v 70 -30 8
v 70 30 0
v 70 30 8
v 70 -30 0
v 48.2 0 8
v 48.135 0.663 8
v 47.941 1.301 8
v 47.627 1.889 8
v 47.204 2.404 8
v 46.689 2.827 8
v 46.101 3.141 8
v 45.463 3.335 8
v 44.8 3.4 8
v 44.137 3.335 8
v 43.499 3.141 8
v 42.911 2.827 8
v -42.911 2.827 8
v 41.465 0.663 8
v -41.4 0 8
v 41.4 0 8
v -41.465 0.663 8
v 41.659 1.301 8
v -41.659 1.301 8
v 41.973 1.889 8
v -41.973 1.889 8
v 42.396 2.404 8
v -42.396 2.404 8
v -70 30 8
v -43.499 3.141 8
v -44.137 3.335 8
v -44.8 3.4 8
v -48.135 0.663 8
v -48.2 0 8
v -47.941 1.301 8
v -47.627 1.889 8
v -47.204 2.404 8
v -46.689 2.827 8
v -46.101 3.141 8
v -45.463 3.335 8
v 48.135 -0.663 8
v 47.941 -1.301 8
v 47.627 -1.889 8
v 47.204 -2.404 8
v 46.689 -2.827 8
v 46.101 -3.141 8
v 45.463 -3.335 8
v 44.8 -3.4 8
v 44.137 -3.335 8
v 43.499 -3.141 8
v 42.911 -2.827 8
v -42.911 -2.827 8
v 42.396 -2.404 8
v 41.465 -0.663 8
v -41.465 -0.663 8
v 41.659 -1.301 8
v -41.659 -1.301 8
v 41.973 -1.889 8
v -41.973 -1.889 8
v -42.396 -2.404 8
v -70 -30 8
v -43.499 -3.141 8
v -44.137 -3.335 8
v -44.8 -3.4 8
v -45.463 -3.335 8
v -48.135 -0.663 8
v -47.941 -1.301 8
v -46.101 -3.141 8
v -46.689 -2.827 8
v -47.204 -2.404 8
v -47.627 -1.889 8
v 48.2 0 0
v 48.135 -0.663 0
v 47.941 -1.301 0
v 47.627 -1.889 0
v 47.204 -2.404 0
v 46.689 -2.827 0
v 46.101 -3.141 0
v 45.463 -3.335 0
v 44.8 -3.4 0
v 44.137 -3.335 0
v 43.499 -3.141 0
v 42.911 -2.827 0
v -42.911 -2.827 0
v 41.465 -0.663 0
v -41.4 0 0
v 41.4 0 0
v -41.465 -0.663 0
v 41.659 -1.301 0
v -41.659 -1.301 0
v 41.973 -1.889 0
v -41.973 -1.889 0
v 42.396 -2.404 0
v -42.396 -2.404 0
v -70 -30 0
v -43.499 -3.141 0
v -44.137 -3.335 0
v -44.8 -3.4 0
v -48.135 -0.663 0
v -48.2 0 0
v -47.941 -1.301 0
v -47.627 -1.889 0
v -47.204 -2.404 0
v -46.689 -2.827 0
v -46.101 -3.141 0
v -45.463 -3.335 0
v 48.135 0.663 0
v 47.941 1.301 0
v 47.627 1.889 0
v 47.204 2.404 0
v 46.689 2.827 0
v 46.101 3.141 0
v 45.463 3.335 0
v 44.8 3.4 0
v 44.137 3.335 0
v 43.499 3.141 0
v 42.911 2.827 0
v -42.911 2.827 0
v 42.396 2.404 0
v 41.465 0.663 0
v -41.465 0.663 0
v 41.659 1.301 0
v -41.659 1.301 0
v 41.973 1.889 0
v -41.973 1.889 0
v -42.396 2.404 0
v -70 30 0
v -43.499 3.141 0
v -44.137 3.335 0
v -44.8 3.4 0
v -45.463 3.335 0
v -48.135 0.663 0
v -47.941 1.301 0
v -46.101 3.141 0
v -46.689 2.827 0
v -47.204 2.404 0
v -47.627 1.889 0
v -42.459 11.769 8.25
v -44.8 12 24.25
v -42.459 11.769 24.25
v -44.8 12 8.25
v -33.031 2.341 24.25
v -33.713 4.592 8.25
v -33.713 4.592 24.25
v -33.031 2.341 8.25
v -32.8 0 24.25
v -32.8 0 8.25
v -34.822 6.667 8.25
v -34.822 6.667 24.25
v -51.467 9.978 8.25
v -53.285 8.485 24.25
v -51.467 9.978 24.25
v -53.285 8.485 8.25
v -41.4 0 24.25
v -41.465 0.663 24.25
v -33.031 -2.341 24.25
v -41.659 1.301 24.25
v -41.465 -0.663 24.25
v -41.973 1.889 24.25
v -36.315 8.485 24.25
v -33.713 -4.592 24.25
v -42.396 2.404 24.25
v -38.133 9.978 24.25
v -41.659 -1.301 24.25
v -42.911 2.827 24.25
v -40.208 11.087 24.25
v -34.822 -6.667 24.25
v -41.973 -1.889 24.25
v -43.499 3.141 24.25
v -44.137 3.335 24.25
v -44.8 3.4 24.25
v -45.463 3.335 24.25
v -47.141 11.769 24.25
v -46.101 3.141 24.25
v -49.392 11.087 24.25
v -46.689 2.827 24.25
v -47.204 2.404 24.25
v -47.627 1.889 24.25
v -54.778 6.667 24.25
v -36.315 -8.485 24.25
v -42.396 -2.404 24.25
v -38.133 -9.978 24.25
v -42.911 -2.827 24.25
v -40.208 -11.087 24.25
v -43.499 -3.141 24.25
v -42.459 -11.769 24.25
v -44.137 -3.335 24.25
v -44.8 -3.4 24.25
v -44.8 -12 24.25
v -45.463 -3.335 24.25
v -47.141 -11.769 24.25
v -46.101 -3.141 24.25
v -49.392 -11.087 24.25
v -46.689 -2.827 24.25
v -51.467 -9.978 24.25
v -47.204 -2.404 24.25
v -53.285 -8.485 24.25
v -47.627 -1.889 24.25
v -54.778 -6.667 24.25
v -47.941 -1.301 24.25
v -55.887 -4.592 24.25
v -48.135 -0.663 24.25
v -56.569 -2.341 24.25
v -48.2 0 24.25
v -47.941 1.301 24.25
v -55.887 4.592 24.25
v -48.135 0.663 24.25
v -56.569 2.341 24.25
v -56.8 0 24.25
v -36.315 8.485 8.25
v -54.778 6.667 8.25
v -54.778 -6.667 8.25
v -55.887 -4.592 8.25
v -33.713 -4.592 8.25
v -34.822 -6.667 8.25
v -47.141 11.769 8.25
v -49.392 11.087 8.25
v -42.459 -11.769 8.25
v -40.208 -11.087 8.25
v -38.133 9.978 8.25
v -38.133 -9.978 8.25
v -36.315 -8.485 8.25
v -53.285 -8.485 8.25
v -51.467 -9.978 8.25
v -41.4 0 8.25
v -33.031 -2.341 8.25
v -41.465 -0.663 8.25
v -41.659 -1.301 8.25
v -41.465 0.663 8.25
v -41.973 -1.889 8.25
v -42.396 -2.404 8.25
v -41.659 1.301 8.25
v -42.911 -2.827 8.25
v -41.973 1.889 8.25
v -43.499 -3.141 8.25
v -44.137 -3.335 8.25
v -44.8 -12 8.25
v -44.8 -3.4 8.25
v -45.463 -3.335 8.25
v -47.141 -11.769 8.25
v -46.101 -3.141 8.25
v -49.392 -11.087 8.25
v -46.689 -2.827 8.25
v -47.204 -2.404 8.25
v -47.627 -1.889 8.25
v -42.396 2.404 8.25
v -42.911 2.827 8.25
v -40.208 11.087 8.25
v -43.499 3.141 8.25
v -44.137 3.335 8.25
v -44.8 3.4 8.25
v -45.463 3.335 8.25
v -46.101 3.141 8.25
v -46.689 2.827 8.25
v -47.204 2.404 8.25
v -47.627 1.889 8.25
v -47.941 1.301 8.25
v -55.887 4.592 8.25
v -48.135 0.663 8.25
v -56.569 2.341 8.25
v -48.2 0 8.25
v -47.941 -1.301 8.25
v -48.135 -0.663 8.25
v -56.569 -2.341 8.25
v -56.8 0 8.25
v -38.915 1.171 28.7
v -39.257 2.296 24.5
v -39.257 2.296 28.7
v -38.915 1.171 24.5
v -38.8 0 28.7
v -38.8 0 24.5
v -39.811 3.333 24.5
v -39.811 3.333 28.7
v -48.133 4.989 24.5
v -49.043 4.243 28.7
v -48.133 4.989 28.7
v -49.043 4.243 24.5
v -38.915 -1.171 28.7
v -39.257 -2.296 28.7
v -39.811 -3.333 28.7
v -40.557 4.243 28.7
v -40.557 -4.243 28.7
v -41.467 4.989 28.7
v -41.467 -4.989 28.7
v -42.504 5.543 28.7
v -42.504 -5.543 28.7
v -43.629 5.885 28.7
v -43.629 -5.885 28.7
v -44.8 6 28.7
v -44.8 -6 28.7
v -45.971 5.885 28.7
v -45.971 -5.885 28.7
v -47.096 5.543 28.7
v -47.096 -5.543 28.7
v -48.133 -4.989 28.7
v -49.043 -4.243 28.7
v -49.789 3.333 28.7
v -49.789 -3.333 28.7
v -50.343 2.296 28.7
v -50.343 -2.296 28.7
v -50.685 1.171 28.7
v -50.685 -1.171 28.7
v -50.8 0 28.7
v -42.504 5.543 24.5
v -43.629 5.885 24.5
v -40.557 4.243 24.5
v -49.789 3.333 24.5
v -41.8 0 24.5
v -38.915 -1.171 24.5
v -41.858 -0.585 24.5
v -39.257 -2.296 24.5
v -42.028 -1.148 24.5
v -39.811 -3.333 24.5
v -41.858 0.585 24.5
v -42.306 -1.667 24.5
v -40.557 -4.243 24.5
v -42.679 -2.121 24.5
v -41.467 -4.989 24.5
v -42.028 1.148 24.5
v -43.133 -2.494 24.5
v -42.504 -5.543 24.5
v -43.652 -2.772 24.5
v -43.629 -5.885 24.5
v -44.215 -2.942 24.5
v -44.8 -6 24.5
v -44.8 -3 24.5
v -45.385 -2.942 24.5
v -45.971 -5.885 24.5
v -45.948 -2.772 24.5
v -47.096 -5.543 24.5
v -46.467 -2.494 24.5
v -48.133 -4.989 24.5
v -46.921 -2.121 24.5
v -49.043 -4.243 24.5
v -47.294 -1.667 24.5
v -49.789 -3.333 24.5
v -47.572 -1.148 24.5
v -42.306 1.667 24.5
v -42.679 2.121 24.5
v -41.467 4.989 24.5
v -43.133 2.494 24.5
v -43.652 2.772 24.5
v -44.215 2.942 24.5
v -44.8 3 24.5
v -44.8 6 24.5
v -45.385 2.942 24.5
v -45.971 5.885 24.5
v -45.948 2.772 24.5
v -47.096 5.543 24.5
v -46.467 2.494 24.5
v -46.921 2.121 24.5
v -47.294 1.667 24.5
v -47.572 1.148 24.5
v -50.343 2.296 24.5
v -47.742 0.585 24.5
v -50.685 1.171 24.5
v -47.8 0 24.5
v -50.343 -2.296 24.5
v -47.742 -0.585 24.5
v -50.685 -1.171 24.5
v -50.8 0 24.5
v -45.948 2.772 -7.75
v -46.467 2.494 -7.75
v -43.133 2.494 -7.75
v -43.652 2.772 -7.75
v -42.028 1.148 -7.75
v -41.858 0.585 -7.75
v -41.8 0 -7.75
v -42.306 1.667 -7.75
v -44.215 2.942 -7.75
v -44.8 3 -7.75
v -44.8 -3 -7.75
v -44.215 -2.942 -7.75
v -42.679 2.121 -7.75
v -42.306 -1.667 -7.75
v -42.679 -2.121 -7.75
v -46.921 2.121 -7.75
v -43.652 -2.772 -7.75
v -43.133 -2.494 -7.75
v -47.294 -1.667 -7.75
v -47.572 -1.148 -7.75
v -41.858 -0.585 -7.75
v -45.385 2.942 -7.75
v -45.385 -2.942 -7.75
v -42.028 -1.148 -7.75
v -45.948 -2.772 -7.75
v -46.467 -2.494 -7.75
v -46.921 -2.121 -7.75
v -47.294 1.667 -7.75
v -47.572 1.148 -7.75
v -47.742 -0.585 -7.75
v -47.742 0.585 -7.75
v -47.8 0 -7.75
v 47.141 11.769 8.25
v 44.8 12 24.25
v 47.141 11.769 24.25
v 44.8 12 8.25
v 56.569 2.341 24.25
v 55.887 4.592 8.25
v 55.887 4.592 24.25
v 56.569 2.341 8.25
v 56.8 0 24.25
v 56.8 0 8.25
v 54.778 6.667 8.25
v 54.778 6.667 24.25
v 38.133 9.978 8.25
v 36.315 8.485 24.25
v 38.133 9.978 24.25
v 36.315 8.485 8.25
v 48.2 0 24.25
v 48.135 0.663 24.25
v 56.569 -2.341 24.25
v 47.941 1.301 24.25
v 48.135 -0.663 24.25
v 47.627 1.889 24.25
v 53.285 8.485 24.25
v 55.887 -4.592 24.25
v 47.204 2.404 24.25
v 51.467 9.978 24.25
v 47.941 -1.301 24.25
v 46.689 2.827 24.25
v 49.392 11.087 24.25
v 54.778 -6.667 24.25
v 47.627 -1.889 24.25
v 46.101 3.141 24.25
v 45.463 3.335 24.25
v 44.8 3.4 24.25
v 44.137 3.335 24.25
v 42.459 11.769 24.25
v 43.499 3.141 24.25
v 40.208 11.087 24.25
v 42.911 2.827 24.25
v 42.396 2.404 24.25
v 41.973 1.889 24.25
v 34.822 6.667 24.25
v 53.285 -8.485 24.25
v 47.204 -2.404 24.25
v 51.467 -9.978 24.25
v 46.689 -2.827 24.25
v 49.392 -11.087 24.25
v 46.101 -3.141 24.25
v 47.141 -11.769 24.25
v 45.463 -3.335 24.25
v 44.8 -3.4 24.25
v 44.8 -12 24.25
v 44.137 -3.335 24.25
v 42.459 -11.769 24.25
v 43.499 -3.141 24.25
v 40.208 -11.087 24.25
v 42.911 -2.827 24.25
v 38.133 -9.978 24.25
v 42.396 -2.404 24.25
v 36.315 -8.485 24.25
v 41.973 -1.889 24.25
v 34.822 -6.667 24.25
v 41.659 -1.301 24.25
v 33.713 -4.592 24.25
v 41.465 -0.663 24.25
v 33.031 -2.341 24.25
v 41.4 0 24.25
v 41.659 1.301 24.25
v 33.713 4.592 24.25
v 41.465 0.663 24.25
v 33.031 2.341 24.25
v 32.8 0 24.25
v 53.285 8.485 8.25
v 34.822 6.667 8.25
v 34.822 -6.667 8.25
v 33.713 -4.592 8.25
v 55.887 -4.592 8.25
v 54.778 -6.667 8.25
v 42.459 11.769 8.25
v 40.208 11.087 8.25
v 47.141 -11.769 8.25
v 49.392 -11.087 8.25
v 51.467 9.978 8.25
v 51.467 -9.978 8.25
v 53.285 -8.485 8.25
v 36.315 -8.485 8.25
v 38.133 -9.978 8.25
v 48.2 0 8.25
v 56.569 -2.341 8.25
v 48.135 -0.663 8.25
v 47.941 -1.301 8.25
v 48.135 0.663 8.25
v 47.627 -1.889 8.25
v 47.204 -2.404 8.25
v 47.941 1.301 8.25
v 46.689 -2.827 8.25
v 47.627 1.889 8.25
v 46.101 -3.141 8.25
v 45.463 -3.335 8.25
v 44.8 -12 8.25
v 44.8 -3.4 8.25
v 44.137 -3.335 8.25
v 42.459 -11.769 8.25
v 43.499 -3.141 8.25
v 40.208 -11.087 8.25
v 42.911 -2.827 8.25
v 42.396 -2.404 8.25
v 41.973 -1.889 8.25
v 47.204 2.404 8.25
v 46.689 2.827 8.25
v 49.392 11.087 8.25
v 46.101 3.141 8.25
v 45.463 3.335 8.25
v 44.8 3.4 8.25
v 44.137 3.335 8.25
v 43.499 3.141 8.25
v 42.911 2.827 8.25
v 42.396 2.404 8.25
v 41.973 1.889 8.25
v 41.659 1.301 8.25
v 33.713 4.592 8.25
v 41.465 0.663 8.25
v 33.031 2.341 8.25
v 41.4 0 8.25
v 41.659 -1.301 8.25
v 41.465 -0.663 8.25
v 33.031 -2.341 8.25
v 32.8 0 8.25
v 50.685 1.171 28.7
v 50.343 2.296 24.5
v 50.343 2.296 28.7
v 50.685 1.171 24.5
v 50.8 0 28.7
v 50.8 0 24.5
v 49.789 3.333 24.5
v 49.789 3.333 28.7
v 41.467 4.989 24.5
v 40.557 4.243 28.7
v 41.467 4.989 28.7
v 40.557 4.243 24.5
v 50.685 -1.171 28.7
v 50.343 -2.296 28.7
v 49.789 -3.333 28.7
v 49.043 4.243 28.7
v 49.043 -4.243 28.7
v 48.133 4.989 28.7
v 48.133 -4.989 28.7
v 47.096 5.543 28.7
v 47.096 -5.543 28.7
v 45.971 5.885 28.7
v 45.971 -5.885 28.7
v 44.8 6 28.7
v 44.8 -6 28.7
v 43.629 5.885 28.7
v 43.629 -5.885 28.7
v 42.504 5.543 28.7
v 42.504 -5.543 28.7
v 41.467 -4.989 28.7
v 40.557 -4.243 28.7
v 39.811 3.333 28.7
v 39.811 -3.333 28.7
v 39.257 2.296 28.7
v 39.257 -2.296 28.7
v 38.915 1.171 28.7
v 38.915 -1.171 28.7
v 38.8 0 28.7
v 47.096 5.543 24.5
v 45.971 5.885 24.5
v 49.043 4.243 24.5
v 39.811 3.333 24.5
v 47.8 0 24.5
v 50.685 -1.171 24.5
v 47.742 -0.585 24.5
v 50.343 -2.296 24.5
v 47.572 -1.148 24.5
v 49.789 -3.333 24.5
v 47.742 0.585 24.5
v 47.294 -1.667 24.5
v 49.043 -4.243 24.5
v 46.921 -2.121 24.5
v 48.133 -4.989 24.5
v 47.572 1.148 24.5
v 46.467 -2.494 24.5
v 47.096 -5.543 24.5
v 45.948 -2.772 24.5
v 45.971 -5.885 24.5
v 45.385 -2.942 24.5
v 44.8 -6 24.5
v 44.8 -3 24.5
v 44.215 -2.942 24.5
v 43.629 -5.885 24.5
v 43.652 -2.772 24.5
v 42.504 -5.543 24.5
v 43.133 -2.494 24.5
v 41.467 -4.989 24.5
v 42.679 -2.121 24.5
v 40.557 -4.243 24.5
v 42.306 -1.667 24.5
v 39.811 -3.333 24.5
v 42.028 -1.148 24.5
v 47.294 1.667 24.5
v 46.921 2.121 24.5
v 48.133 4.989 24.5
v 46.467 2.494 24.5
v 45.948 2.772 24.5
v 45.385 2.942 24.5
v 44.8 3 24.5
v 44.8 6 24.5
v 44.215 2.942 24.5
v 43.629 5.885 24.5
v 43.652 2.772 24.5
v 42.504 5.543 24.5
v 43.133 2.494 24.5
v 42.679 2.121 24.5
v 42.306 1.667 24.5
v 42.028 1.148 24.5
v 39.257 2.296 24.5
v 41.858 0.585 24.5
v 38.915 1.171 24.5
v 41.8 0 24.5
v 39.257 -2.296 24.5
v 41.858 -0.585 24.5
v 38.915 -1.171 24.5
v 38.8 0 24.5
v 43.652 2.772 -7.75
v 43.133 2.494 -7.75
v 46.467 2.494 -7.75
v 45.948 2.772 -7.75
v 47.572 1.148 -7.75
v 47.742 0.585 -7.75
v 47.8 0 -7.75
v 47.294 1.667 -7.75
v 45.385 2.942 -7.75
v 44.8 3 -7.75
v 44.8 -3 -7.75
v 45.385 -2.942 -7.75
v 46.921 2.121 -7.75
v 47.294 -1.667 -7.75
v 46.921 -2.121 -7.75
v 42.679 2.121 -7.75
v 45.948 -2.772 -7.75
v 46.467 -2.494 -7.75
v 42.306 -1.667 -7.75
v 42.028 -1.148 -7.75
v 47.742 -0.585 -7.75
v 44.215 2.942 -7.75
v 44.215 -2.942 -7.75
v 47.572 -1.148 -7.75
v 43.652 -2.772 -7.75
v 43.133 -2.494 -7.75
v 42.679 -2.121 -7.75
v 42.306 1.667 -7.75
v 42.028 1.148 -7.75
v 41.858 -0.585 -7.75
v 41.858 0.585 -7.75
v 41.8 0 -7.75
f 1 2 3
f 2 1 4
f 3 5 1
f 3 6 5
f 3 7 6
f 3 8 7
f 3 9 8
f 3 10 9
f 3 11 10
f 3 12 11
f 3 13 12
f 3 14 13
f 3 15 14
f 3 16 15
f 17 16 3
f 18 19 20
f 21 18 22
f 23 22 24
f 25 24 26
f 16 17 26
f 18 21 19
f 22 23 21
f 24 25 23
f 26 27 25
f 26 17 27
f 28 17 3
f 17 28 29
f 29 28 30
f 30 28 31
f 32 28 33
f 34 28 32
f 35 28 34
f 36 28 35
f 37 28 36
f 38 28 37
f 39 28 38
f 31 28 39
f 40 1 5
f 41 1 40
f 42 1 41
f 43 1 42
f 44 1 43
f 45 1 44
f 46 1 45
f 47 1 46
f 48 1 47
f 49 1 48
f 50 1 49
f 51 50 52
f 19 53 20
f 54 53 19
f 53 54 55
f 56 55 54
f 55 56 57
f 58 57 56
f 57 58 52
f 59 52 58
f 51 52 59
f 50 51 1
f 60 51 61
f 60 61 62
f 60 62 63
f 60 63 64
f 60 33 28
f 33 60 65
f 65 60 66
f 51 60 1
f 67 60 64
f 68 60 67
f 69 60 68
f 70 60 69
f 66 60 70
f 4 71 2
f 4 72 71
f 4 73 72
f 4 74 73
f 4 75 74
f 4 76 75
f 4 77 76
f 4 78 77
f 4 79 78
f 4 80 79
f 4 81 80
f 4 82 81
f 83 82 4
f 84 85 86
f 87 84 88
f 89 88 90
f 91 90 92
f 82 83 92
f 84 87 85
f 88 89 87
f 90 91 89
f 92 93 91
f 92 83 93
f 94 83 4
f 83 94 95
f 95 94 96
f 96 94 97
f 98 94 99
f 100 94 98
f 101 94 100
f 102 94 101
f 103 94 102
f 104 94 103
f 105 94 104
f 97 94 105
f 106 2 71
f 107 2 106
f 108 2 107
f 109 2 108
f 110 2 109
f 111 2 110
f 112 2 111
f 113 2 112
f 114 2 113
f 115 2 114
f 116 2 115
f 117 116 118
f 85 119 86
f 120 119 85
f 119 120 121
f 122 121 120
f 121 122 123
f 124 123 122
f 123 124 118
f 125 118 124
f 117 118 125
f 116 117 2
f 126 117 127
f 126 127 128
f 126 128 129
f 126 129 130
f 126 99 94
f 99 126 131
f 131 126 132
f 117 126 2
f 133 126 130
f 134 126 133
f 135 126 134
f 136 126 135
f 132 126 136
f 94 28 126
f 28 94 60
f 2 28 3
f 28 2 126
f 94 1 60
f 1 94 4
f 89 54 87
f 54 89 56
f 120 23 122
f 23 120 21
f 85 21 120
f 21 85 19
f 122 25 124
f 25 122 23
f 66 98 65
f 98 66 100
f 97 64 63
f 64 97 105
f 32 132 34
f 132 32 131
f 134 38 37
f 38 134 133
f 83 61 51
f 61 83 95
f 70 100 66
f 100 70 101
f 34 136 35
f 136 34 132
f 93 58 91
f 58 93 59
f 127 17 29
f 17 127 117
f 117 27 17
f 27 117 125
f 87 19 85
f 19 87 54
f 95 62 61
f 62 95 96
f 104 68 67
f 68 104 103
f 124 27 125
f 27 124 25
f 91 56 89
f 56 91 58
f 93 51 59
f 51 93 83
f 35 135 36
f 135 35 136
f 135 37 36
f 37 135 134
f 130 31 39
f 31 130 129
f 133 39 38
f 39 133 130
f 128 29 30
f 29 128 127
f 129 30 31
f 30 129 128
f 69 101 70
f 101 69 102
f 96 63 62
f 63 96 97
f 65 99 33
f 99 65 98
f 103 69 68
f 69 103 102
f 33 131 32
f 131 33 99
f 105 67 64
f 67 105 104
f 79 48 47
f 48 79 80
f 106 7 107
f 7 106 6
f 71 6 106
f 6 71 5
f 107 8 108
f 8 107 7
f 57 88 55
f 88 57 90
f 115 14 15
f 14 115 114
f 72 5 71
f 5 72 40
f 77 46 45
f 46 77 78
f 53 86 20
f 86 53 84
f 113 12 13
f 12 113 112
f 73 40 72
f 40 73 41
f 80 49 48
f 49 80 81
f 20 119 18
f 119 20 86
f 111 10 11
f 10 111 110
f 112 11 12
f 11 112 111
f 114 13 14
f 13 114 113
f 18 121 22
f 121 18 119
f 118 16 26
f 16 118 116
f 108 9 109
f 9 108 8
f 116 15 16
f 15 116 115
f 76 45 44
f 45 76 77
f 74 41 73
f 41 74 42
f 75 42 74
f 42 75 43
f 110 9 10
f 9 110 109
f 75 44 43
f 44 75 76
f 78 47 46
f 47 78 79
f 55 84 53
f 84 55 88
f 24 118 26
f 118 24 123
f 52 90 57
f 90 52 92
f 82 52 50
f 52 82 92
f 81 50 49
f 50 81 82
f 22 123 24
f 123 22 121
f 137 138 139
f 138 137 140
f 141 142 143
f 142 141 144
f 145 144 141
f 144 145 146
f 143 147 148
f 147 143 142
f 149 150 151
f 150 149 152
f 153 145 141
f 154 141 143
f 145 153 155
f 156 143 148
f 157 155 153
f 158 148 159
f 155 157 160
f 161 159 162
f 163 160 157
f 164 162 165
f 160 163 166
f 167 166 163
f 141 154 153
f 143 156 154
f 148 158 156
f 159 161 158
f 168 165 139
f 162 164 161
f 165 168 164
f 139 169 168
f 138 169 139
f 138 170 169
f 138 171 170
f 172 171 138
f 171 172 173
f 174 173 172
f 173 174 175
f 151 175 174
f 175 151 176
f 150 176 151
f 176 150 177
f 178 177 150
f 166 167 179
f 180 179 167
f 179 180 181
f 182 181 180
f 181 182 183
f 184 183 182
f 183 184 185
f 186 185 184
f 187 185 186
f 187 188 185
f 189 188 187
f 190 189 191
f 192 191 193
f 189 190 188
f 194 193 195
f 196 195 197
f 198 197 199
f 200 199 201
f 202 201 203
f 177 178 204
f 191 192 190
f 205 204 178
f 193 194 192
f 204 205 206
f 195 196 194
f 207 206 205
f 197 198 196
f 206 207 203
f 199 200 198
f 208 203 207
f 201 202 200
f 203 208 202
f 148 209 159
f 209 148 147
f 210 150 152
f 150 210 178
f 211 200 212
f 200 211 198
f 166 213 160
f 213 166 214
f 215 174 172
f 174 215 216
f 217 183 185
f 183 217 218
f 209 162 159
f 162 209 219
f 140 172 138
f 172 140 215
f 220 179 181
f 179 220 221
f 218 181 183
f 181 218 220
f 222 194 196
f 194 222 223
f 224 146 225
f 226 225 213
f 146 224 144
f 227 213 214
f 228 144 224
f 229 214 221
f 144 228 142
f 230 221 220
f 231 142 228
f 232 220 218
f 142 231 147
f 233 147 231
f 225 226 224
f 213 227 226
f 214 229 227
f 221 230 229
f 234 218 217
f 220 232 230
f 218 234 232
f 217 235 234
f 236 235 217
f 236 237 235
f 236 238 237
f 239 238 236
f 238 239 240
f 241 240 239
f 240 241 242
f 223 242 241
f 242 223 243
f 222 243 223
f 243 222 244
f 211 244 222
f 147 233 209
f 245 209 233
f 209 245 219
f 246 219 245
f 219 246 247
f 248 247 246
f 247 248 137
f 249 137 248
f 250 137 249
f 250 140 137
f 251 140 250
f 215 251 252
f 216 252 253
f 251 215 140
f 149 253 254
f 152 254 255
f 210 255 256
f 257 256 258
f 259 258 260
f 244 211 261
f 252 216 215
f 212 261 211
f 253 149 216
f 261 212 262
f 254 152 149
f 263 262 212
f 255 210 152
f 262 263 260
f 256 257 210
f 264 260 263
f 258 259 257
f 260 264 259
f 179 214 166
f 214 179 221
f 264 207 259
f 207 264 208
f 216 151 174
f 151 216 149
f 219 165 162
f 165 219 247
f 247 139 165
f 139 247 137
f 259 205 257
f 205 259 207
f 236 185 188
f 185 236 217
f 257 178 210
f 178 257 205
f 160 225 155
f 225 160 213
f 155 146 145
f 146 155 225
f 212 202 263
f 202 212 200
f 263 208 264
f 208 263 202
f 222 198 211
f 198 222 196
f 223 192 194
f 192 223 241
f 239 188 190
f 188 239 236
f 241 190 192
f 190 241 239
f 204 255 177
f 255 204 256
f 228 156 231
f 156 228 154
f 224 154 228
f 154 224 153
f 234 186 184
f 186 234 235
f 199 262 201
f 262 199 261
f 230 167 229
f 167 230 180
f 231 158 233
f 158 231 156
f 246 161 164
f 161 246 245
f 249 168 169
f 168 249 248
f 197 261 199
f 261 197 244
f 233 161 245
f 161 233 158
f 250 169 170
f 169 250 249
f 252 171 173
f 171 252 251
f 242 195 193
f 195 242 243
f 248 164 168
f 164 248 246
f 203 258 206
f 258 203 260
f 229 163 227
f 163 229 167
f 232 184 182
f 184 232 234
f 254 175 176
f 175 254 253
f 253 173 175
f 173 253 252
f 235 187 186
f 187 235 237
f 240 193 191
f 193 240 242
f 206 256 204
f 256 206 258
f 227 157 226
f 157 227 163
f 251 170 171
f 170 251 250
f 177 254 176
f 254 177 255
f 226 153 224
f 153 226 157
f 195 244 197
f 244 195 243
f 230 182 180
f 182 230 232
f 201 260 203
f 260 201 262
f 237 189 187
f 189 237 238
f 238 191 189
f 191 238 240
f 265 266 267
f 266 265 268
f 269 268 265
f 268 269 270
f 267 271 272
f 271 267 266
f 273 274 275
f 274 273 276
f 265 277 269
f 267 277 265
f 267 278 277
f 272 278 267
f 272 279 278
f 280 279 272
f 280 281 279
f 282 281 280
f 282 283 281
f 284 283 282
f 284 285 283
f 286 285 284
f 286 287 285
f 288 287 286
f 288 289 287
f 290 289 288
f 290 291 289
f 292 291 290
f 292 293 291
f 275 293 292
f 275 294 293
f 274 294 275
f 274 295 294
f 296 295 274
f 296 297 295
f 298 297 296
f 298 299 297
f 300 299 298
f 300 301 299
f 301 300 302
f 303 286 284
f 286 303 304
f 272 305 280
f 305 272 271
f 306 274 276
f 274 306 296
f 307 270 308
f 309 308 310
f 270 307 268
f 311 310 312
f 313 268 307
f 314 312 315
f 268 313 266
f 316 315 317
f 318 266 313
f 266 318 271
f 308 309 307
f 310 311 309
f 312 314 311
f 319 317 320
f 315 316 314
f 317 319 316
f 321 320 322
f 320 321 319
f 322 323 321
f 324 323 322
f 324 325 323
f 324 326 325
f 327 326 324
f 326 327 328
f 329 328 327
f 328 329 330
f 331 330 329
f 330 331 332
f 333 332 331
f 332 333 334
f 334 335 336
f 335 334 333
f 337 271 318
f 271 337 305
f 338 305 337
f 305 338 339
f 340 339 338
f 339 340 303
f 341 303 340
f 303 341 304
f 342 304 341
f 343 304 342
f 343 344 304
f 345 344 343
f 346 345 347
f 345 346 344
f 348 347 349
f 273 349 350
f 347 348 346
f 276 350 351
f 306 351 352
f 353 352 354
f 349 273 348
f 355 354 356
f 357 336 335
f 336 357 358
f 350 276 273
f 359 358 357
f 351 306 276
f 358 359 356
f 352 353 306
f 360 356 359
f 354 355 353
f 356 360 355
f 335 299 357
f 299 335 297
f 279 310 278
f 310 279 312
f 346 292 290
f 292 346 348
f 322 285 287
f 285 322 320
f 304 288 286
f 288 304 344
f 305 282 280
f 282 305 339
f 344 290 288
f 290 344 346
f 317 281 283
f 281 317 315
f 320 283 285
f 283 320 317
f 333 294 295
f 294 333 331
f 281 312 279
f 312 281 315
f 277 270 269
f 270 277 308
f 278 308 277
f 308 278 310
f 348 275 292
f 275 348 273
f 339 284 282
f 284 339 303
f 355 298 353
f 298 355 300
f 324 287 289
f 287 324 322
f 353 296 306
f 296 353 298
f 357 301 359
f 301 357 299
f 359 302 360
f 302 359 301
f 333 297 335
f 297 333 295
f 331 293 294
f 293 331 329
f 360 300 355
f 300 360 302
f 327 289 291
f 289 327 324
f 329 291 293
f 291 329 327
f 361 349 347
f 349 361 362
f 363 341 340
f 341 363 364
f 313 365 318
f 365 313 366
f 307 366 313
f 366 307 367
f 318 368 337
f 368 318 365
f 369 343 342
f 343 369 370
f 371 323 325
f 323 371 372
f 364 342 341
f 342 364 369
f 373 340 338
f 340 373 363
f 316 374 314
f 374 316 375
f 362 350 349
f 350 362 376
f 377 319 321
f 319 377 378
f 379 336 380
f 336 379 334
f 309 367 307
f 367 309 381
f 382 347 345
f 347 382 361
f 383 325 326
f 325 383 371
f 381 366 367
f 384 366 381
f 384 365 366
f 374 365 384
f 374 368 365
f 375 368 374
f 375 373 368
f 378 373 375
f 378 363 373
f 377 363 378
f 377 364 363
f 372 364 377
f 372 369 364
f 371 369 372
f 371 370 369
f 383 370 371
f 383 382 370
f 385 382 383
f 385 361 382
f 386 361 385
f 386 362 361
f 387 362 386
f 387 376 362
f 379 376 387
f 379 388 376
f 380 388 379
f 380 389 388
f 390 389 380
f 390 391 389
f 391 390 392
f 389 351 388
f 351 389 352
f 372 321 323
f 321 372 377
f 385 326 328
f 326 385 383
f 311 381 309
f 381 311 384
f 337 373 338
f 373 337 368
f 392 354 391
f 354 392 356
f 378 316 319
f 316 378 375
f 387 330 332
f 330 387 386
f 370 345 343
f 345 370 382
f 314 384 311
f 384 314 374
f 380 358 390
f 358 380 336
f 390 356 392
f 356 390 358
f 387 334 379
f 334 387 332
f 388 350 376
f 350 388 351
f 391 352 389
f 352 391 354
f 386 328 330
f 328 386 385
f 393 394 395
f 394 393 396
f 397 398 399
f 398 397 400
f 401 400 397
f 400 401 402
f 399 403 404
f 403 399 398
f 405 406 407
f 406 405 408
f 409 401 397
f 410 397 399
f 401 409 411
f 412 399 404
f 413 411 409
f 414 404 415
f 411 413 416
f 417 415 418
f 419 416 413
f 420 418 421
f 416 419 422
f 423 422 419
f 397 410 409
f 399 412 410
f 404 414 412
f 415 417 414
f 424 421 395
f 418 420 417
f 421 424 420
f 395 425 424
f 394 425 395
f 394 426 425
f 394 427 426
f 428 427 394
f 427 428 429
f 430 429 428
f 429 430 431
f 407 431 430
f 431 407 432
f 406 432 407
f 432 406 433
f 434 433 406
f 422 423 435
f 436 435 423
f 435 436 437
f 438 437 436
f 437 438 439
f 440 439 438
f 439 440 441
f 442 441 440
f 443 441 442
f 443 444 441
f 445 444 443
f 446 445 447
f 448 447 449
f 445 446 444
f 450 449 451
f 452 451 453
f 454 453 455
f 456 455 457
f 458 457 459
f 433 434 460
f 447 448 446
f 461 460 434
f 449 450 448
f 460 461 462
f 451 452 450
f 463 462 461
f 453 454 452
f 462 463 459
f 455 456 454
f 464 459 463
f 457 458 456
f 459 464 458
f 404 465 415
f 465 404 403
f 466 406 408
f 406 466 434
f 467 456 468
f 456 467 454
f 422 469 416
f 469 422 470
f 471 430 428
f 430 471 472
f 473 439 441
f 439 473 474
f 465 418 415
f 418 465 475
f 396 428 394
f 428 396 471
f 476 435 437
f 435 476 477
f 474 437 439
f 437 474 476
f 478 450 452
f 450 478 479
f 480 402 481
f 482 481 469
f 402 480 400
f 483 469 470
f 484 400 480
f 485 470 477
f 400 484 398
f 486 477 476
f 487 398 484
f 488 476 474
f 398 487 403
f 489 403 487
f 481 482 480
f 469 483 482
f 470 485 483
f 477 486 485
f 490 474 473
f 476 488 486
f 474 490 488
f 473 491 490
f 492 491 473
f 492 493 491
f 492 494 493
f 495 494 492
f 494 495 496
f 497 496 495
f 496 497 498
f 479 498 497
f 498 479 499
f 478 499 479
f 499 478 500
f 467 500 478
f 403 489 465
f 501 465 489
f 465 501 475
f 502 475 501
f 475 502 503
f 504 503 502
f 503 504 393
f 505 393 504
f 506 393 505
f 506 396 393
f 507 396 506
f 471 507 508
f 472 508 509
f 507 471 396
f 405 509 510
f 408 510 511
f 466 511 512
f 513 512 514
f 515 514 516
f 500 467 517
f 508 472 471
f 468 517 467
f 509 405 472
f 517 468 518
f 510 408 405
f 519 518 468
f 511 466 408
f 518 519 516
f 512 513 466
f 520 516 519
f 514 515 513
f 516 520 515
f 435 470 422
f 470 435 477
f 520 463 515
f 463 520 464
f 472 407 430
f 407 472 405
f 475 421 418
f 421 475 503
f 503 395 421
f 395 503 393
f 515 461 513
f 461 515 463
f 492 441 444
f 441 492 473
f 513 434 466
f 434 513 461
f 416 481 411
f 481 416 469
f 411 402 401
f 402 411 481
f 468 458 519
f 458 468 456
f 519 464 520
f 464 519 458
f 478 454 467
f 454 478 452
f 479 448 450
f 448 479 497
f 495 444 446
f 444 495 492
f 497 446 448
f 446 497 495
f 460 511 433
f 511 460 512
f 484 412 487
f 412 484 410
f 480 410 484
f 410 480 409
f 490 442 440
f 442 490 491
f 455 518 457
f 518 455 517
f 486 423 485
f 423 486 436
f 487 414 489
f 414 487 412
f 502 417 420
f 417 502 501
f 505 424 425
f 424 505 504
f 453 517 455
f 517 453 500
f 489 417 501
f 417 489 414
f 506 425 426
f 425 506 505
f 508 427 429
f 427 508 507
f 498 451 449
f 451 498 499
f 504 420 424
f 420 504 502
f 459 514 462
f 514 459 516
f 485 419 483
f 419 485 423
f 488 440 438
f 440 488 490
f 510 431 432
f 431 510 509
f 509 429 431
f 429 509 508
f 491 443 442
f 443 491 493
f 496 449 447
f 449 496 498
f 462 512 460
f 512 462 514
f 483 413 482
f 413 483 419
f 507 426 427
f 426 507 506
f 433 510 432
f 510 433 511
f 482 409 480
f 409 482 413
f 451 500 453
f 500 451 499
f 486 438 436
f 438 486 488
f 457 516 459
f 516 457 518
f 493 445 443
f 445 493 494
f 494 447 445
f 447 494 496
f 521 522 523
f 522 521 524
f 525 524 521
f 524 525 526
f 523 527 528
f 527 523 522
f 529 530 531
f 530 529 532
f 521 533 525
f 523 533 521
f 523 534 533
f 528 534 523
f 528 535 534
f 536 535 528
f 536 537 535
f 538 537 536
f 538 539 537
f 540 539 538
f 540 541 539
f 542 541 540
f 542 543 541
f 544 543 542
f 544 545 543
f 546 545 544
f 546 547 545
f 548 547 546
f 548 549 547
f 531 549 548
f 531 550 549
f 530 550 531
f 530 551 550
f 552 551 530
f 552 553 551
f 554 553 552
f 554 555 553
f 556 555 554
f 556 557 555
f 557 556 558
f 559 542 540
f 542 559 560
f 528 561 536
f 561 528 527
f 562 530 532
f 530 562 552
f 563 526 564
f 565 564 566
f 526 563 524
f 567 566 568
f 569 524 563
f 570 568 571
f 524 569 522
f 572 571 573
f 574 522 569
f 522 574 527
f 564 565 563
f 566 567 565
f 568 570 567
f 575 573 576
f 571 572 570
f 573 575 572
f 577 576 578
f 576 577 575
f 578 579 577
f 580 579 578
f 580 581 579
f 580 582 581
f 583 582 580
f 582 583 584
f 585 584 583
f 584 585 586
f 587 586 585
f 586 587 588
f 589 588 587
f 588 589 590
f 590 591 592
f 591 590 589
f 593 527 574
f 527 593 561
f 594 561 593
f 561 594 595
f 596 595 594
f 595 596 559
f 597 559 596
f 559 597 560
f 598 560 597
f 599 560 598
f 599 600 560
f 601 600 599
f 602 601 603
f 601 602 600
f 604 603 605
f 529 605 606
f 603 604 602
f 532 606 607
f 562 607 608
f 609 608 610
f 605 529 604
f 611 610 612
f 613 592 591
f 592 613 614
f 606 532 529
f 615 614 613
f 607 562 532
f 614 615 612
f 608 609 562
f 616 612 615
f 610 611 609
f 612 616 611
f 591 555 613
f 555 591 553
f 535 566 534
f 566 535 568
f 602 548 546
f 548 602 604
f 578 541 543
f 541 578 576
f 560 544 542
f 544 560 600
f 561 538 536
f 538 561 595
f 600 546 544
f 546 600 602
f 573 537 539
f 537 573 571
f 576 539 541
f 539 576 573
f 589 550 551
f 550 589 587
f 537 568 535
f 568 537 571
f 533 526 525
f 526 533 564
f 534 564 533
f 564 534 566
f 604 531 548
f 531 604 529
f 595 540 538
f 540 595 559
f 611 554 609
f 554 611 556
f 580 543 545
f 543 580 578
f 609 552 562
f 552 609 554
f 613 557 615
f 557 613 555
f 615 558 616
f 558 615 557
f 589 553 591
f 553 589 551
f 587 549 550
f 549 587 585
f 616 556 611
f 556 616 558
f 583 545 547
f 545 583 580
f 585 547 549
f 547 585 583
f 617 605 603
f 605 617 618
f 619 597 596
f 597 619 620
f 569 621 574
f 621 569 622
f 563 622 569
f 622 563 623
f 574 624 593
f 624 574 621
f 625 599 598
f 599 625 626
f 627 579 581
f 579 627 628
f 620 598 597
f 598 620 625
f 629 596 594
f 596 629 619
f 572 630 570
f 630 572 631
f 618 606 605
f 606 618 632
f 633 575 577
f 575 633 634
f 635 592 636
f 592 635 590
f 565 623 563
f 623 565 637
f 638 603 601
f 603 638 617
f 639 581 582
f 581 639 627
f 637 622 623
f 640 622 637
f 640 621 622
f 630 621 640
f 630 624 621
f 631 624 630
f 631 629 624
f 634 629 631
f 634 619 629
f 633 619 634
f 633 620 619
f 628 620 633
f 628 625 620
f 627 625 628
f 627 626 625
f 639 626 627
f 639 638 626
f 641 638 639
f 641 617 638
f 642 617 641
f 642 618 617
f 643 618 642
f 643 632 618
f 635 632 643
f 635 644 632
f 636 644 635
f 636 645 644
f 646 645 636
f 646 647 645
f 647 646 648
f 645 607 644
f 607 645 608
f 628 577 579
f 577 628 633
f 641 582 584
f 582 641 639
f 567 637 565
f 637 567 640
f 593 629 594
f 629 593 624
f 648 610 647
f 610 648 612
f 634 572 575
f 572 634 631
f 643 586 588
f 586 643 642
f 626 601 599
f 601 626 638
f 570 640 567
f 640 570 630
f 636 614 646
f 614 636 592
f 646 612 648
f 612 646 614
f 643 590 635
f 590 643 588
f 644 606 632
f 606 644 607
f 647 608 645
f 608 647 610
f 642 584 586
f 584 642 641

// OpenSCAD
$fn = 32;

// ------------------------------------------------------------------------
// Standoff columns: 2 d24 standoffs, bolts d6
// Every part is its own module, assembly() places them once.
// ------------------------------------------------------------------------

// --- part 1 ---
module base_plate() {
  difference() {
    translate([-70, -30, 0]) cube([140, 60, 8]);
    translate([-44.8, 0, -1]) cylinder(h = 10, d = 6.8);
    translate([44.8, 0, -1]) cylinder(h = 10, d = 6.8);
  }
}

// --- part 2 ---
module spacer1() {
  difference() {
      translate([0, 0, 0]) cylinder(h = 16, d = 24);
      translate([0, 0, -1]) cylinder(h = 18, d = 6.8);
    }
}

// --- part 3 ---
module bolt1() {
  cylinder(h = 4.2, d = 12);
  translate([0, 0, -32.25]) cylinder(h = 32.25, d = 6);
}

// --- part 4 ---
module spacer2() {
  difference() {
      translate([0, 0, 0]) cylinder(h = 16, d = 24);
      translate([0, 0, -1]) cylinder(h = 18, d = 6.8);
    }
}

// --- part 5 ---
module bolt2() {
  cylinder(h = 4.2, d = 12);
  translate([0, 0, -32.25]) cylinder(h = 32.25, d = 6);
}

// --- assembly ---
module assembly() {
  translate([0, 0, 0]) rotate([0, 0, 0]) base_plate();
  translate([-44.8, 0, 8.25]) rotate([0, 0, 0]) spacer1();
  translate([-44.8, 0, 24.5]) rotate([0, 0, 0]) bolt1();
  translate([44.8, 0, 8.25]) rotate([0, 0, 0]) spacer2();
  translate([44.8, 0, 24.5]) rotate([0, 0, 0]) bolt2();
}

assembly();
